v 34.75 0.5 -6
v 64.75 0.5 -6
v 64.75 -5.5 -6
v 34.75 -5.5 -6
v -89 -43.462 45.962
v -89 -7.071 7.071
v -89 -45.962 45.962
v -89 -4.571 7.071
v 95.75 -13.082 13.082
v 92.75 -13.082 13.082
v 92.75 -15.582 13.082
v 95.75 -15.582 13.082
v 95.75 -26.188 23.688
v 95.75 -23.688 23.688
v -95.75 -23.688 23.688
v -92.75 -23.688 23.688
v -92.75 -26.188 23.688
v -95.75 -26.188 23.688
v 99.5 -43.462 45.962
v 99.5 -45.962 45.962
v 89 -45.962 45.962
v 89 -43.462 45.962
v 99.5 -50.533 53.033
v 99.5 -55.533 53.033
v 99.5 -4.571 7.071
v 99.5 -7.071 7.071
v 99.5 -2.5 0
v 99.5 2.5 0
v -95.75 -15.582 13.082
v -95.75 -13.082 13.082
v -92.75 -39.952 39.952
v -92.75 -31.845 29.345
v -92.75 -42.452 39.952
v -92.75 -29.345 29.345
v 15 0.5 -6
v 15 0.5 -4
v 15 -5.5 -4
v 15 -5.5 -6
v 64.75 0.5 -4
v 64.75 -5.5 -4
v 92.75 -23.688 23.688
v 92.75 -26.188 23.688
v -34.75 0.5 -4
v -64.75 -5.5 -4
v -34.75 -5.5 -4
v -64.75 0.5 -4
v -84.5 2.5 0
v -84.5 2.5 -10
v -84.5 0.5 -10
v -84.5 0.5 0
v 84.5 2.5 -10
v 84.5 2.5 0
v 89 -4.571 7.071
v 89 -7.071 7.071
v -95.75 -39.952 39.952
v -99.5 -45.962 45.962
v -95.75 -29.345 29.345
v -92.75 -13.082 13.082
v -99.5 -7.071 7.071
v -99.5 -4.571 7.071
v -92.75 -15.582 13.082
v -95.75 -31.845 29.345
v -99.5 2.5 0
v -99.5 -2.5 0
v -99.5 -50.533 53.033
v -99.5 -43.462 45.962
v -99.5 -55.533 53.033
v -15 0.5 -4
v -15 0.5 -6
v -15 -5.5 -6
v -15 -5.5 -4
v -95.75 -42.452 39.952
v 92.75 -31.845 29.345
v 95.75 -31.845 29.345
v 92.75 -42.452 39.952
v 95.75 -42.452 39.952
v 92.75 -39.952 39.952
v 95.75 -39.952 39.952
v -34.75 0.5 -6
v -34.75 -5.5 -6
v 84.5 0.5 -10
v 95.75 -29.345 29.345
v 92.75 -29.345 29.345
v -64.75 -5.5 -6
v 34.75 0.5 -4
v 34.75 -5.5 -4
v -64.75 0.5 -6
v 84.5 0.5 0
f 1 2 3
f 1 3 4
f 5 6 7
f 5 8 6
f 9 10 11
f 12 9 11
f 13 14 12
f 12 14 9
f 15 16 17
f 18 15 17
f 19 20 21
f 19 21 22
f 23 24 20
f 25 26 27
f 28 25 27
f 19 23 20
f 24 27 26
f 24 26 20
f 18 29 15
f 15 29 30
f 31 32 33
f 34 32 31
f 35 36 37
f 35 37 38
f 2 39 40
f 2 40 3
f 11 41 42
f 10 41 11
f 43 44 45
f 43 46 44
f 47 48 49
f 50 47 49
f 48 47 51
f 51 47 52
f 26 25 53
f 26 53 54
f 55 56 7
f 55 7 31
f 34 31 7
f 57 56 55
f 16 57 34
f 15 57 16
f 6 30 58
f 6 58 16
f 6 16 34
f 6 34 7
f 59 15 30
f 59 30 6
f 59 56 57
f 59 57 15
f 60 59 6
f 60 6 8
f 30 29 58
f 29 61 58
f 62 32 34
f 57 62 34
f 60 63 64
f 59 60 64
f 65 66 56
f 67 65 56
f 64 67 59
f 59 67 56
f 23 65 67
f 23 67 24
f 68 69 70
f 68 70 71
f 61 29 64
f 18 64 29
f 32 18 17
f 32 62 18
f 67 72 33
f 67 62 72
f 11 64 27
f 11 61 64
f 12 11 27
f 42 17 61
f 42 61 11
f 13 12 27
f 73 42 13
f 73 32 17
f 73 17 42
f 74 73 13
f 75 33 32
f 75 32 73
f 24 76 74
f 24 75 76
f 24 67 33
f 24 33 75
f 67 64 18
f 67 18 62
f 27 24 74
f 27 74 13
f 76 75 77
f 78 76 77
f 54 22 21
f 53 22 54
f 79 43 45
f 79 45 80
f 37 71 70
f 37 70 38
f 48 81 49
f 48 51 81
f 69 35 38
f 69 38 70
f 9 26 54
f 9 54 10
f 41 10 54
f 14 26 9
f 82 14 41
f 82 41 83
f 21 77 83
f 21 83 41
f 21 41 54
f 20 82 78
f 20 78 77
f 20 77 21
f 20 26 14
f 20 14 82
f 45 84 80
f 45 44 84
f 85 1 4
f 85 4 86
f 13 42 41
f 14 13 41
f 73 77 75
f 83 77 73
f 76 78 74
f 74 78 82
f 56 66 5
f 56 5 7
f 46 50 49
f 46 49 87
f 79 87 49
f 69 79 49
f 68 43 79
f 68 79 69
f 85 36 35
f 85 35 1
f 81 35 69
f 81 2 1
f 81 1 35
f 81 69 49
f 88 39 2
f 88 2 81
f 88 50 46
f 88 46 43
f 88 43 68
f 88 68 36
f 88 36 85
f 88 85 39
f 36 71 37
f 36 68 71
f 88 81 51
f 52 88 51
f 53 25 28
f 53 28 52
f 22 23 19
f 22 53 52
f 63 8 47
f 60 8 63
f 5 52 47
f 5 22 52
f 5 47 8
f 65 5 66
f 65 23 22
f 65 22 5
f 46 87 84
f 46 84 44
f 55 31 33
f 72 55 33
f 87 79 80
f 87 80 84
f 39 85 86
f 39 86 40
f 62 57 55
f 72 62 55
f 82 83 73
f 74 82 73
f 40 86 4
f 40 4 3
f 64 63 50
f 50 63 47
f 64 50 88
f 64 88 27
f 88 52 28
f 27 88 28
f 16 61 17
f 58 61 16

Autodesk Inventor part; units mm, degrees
ref_plane "YZ Plane" through (0, 0, 0) normal (1, 0, 0) x (0, 1, 0)
ref_plane "XZ Plane" through (0, 0, 0) normal (0, 1, 0) x (-1, 0, 0)
sketch "Sketch2" plane through (0, 0, 0) normal (0, 0, 1) x (1, 0, 0)
  line L0 (-99.5, 2.5) -> (99.5, 2.5)
  line L1 (99.5, 2.5) -> (99.5, -2.5)
  line L2 (99.5, -2.5) -> (-99.5, -2.5)
  line L3 (-99.5, -2.5) -> (-99.5, 2.5)
  point P0 (0, 0)
  dimension "d1" = 199
  dimension "d2" = 5
  dimension "d3" = 2.5
  dimension "d4" = 99.5
sketch "Sketch3" plane through (0, 0, 0) normal (1, 0, 0) x (0, 1, 0)
  line L0 (0, 0) -> (-53.033, 53.033)
  line L1 (0, -0.5221) -> (1.6531, -0.5221)
  dimension "d5" = 75
  dimension "d6" = 45
sweep "Sweep1" add profiles "Sketch2" path "Sketch3" path curves L0
sketch "Sketch4" plane through (-99.5, 2.5, 0) normal (0, 0.7071, 0.7071) x (1, 0, 0)
  line L0 (0, 0) -> (199, 0) projected
  line L1 (0, 0) -> (0, -75) projected
  line L2 (199, -75) -> (0, -75) projected
  line L3 (199, 0) -> (199, -75) projected
  line L4 (199, 0) -> (199, -75)
  line L5 (199, 0) -> (274, -75)
  line L6 (274, -75) -> (199, -75)
  point P0 (99.5, -1.7678)
  dimension "d9" = 45
sketch "Sketch5" plane through (99.5, -2.5, 0) normal (1, 0, 0) x (0, 0, -1)
  line L0 (0, 5) -> (0, 0) projected
  line L1 (0, 5) -> (-53.033, -48.033) projected
  line L2 (-53.033, -53.033) -> (-53.033, -48.033) projected
  line L3 (0, 0) -> (-53.033, -53.033) projected
  line L4 (-26.5165, -21.5165) -> (-26.5165, -26.5165)
  point P0 (0, 2.5)
sweep "Sweep2" [suppressed]
mirror "Mirror1" [suppressed]
sketch "Sketch6" plane through (99.5, 2.5, 0) normal (0, 0, -1) x (-1, 0, 0)
  line L0 (199, 0) -> (0, 0) projected
  line L1 (0, 0) -> (0, -5) projected
  line L2 (0, -5) -> (199, -5) projected
  line L3 (199, -5) -> (199, 0) projected
  line L4 (0, 0) -> (199, 0)
  line L5 (199, 0) -> (199, -2)
  line L6 (199, -2) -> (0, -2)
  line L7 (0, -2) -> (0, 0)
  line L8 (98.5, -2) -> (100.5, -2)
  line L9 (100.5, -2) -> (100.5, -5)
  line L10 (100.5, -5) -> (98.5, -5)
  line L11 (98.5, -5) -> (98.5, -2)
  line L12 (48.25, -2) -> (50.25, -2)
  line L13 (50.25, -2) -> (50.25, -5)
  line L14 (50.25, -5) -> (48.25, -5)
  line L15 (48.25, -5) -> (48.25, -2)
  line L16 (148.75, -2) -> (150.75, -2)
  line L17 (150.75, -2) -> (150.75, -5)
  line L18 (150.75, -5) -> (148.75, -5)
  line L19 (148.75, -5) -> (148.75, -2)
  point P0 (99.5, -2.5)
  dimension "d12" = 2
  dimension "d13" = 2
  dimension "d14" = 199
  dimension "d15" = 1
  dimension "d16" = 2
  dimension "d17" = 2
  dimension "d18" = 48.25
  dimension "d19" = 48.25
  dimension "d20" = 48.25
  dimension "d21" = 48.25
extrude "Extrusion1" [suppressed]
sketch "Sketch7" plane through (1, 0.5, 0) normal (0, -1, 0) x (1, 0, 0)
  line L0 (63, 0) -> (63, -10) projected
  line L1 (124, -10) -> (63, -10) projected
  line L2 (124, 0) -> (124, -10) projected
  line L3 (63, 0) -> (124, 0) projected
  line L4 (61, 0) -> (61, -10) projected
  line L5 (0, 0) -> (61, 0) projected
  line L6 (0, 0) -> (0, -10) projected
  line L7 (61, -10) -> (0, -10) projected
  line L8 (-63, 0) -> (-63, -10) projected
  line L9 (-2, -10) -> (-63, -10) projected
  line L10 (-2, 0) -> (-2, -10) projected
  line L11 (-63, 0) -> (-2, 0) projected
  line L12 (-65, -10) -> (-65, 0) projected
  line L13 (-126, 0) -> (-65, 0) projected
  line L14 (-126, 0) -> (-126, -10) projected
  line L15 (-65, -10) -> (-126, -10) projected
  line L16 (67, -4) -> (57, -4)
  line L17 (57, -4) -> (57, -6)
  line L18 (57, -6) -> (67, -6)
  line L19 (67, -6) -> (67, -4)
  line L20 (4, -4) -> (-6, -4)
  line L21 (-6, -4) -> (-6, -6)
  line L22 (-6, -6) -> (4, -6)
  line L23 (4, -6) -> (4, -4)
  line L24 (-59, -4) -> (-69, -4)
  line L25 (-69, -4) -> (-69, -6)
  line L26 (-69, -6) -> (-59, -6)
  line L27 (-59, -6) -> (-59, -4)
  point P0 (-1, 0)
  dimension "d24" = 10
  dimension "d25" = 2
  dimension "d26" = 4
  dimension "d27" = 4
  dimension "d28" = 4
  dimension "d29" = 4
  dimension "d30" = 10
  dimension "d31" = 2
  dimension "d32" = 4
  dimension "d33" = 4
  dimension "d34" = 4
  dimension "d35" = 10
  dimension "d36" = 4
  dimension "d39" = 2
  dimension "d40" = 4
  dimension "d41" = 4
extrude "Extrusion2" [suppressed]
sketch "Sketch10" plane through (99.5, 2.5, 0) normal (0, 0, -1) x (-1, 0, 0)
  line L0 (199, 0) -> (0, 0) projected
  line L1 (0, 0) -> (0, -5) projected
  line L2 (0, -5) -> (199, -5) projected
  line L3 (199, -5) -> (199, 0) projected
  line L4 (15, 0) -> (184, 0)
  line L5 (184, 0) -> (184, -2)
  line L6 (184, -2) -> (15, -2)
  line L7 (15, -2) -> (15, 0)
  point P0 (99.5, -2.5)
  dimension "d76" = 2
  dimension "d77" = 169
  dimension "d78" = 84.5
extrude "Extrusion5" add sketch "Sketch10" along normal blind 10 contours L5 L6 L7 L0
sketch "Sketch11" plane through (-84.5, 0.5, 0) normal (0, -1, 0) x (1, 0, 0)
  line L0 (0, 0) -> (169, 0) projected
  line L1 (0, 0) -> (0, -10) projected
  line L2 (169, -10) -> (0, -10) projected
  line L3 (169, 0) -> (169, -10) projected
  line L4 (149.25, -6) -> (119.25, -6)
  line L5 (119.25, -6) -> (119.25, -4)
  line L6 (119.25, -4) -> (149.25, -4)
  line L7 (149.25, -4) -> (149.25, -6)
  line L8 (99.5, -6) -> (69.5, -6)
  line L9 (69.5, -6) -> (69.5, -4)
  line L10 (69.5, -4) -> (99.5, -4)
  line L11 (99.5, -4) -> (99.5, -6)
  line L12 (49.75, -6) -> (19.75, -6)
  line L13 (19.75, -6) -> (19.75, -4)
  line L14 (19.75, -4) -> (49.75, -4)
  line L15 (49.75, -4) -> (49.75, -6)
  point P0 (84.5, 0)
  dimension "d81" = 2
  dimension "d82" = 10
  dimension "d83" = 4
  dimension "d84" = 30
  dimension "d85" = 19.75
  dimension "d86" = 169
  dimension "d87" = 19.75
  dimension "d88" = 19.75
  dimension "d89" = 30
  dimension "d90" = 30
  dimension "d91" = 19.75
extrude "Extrusion6" add sketch "Sketch11" along normal blind 6 contours L4 L5 L6 L7 | L8 L9 L10 L11 | L12 L13 L14 L15
sketch "Sketch12" plane through (99.5, -2.5, 0) normal (1, 0, 0) x (0, 0, -1)
  line L0 (0, 5) -> (0, 0) projected
  line L1 (0, 5) -> (-53.033, -48.033) projected
  line L2 (-53.033, -53.033) -> (-53.033, -48.033) projected
  line L3 (0, 0) -> (-53.033, -53.033) projected
  line L4 (-7.0711, -2.0711) -> (-7.0711, -4.5711)
  line L5 (-7.0711, -4.5711) -> (-45.9619, -43.4619)
  line L6 (-45.9619, -43.4619) -> (-45.9619, -40.9619)
  line L7 (-45.9619, -40.9619) -> (-7.0711, -2.0711)
  dimension "d99" = 2.5
  dimension "d100" = 10
  dimension "d101" = 10
extrude "Extrusion7" cut sketch "Sketch12" against normal blind 10.5 contours L4 L5 L6 L1
ref_plane "Work Plane1" through (94.25, -2.5, 0) normal (1, 0, 0) x (0, 0, -1)
sketch "Sketch13" plane through (94.25, -2.5, 0) normal (1, 0, 0) x (0, 0, -1)
  line L0 (-7.0711, -2.0711) -> (-7.0711, -4.5711) projected
  line L1 (-7.0711, -4.5711) -> (-45.9619, -43.4619) projected
  line L2 (-45.9619, -43.4619) -> (-45.9619, -40.9619) projected
  line L3 (-45.9619, -40.9619) -> (-53.033, -48.033) projected
  line L4 (-53.033, -53.033) -> (-53.033, -48.033) projected
  line L5 (0, 0) -> (-53.033, -53.033) projected
  line L6 (0, 5) -> (0, 0) projected
  line L7 (0, 5) -> (-7.0711, -2.0711) projected
  line L8 (-45.9619, -40.9619) -> (-7.0711, -2.0711) projected
  line L9 (-45.9619, -43.4619) -> (-45.9619, -40.9619) projected
  line L10 (-7.0711, -4.5711) -> (-45.9619, -43.4619) projected
  line L11 (-7.0711, -2.0711) -> (-7.0711, -4.5711) projected
  line L12 (-13.0815, -10.5815) -> (-13.0815, -13.0815)
  line L13 (-13.0815, -13.0815) -> (-23.6881, -23.6881)
  line L14 (-23.6881, -23.6881) -> (-23.6881, -21.1881)
  line L15 (-23.6881, -21.1881) -> (-13.0815, -10.5815)
  line L16 (-29.3449, -26.8449) -> (-29.3449, -29.3449)
  line L17 (-29.3449, -29.3449) -> (-39.9515, -39.9515)
  line L18 (-39.9515, -39.9515) -> (-39.9515, -37.4515)
  line L19 (-39.9515, -37.4515) -> (-29.3449, -26.8449)
  point P0 (0, 2.5)
  dimension "d104" = 15
  dimension "d105" = 15
  dimension "d106" = 8.5
  dimension "d107" = 8.5
  dimension "d108" = 8
  dimension "d109" = 55
extrude "Extrusion8" cut sketch "Sketch13" along normal mid plane 3 contours L12 L5 L14 L1 | L1 L16 L5 L18
mirror "Mirror2" about plane through (0, 0, 0) normal (1, 0, 0) of "Extrusion7", "Extrusion8"
ref_plane "Work Plane2" through (-94.25, -2.5, 0) normal (1, 0, 0) x (0, 0, -1)
equation "\"d3\" = 0.5 * d2"
equation "\"d4\" = 0.5 * d1"
equation "\"d15\" = 0.5 * d13"
equation "\"d19\" = d18"
equation "\"d30\" = d24"
equation "\"d31\" = d25"
equation "\"d32\" = d26"
equation "\"d34\" = d27"
equation "\"d35\" = d24"
equation "\"d36\" = d26"
equation "\"d39\" = d25"
equation "\"d41\" = d27"
equation "\"d78\" = 0.5 * d77"
equation "\"d83\" = -0.5 * d81 + 0.5 * d82"
equation "\"d85\" = -0.75 * d84 + 0.25 * d86"
equation "\"d87\" = d85"
equation "\"d88\" = d85"
equation "\"d89\" = d84"
equation "\"d90\" = d84"
properties part number "Roof Width Extension"
